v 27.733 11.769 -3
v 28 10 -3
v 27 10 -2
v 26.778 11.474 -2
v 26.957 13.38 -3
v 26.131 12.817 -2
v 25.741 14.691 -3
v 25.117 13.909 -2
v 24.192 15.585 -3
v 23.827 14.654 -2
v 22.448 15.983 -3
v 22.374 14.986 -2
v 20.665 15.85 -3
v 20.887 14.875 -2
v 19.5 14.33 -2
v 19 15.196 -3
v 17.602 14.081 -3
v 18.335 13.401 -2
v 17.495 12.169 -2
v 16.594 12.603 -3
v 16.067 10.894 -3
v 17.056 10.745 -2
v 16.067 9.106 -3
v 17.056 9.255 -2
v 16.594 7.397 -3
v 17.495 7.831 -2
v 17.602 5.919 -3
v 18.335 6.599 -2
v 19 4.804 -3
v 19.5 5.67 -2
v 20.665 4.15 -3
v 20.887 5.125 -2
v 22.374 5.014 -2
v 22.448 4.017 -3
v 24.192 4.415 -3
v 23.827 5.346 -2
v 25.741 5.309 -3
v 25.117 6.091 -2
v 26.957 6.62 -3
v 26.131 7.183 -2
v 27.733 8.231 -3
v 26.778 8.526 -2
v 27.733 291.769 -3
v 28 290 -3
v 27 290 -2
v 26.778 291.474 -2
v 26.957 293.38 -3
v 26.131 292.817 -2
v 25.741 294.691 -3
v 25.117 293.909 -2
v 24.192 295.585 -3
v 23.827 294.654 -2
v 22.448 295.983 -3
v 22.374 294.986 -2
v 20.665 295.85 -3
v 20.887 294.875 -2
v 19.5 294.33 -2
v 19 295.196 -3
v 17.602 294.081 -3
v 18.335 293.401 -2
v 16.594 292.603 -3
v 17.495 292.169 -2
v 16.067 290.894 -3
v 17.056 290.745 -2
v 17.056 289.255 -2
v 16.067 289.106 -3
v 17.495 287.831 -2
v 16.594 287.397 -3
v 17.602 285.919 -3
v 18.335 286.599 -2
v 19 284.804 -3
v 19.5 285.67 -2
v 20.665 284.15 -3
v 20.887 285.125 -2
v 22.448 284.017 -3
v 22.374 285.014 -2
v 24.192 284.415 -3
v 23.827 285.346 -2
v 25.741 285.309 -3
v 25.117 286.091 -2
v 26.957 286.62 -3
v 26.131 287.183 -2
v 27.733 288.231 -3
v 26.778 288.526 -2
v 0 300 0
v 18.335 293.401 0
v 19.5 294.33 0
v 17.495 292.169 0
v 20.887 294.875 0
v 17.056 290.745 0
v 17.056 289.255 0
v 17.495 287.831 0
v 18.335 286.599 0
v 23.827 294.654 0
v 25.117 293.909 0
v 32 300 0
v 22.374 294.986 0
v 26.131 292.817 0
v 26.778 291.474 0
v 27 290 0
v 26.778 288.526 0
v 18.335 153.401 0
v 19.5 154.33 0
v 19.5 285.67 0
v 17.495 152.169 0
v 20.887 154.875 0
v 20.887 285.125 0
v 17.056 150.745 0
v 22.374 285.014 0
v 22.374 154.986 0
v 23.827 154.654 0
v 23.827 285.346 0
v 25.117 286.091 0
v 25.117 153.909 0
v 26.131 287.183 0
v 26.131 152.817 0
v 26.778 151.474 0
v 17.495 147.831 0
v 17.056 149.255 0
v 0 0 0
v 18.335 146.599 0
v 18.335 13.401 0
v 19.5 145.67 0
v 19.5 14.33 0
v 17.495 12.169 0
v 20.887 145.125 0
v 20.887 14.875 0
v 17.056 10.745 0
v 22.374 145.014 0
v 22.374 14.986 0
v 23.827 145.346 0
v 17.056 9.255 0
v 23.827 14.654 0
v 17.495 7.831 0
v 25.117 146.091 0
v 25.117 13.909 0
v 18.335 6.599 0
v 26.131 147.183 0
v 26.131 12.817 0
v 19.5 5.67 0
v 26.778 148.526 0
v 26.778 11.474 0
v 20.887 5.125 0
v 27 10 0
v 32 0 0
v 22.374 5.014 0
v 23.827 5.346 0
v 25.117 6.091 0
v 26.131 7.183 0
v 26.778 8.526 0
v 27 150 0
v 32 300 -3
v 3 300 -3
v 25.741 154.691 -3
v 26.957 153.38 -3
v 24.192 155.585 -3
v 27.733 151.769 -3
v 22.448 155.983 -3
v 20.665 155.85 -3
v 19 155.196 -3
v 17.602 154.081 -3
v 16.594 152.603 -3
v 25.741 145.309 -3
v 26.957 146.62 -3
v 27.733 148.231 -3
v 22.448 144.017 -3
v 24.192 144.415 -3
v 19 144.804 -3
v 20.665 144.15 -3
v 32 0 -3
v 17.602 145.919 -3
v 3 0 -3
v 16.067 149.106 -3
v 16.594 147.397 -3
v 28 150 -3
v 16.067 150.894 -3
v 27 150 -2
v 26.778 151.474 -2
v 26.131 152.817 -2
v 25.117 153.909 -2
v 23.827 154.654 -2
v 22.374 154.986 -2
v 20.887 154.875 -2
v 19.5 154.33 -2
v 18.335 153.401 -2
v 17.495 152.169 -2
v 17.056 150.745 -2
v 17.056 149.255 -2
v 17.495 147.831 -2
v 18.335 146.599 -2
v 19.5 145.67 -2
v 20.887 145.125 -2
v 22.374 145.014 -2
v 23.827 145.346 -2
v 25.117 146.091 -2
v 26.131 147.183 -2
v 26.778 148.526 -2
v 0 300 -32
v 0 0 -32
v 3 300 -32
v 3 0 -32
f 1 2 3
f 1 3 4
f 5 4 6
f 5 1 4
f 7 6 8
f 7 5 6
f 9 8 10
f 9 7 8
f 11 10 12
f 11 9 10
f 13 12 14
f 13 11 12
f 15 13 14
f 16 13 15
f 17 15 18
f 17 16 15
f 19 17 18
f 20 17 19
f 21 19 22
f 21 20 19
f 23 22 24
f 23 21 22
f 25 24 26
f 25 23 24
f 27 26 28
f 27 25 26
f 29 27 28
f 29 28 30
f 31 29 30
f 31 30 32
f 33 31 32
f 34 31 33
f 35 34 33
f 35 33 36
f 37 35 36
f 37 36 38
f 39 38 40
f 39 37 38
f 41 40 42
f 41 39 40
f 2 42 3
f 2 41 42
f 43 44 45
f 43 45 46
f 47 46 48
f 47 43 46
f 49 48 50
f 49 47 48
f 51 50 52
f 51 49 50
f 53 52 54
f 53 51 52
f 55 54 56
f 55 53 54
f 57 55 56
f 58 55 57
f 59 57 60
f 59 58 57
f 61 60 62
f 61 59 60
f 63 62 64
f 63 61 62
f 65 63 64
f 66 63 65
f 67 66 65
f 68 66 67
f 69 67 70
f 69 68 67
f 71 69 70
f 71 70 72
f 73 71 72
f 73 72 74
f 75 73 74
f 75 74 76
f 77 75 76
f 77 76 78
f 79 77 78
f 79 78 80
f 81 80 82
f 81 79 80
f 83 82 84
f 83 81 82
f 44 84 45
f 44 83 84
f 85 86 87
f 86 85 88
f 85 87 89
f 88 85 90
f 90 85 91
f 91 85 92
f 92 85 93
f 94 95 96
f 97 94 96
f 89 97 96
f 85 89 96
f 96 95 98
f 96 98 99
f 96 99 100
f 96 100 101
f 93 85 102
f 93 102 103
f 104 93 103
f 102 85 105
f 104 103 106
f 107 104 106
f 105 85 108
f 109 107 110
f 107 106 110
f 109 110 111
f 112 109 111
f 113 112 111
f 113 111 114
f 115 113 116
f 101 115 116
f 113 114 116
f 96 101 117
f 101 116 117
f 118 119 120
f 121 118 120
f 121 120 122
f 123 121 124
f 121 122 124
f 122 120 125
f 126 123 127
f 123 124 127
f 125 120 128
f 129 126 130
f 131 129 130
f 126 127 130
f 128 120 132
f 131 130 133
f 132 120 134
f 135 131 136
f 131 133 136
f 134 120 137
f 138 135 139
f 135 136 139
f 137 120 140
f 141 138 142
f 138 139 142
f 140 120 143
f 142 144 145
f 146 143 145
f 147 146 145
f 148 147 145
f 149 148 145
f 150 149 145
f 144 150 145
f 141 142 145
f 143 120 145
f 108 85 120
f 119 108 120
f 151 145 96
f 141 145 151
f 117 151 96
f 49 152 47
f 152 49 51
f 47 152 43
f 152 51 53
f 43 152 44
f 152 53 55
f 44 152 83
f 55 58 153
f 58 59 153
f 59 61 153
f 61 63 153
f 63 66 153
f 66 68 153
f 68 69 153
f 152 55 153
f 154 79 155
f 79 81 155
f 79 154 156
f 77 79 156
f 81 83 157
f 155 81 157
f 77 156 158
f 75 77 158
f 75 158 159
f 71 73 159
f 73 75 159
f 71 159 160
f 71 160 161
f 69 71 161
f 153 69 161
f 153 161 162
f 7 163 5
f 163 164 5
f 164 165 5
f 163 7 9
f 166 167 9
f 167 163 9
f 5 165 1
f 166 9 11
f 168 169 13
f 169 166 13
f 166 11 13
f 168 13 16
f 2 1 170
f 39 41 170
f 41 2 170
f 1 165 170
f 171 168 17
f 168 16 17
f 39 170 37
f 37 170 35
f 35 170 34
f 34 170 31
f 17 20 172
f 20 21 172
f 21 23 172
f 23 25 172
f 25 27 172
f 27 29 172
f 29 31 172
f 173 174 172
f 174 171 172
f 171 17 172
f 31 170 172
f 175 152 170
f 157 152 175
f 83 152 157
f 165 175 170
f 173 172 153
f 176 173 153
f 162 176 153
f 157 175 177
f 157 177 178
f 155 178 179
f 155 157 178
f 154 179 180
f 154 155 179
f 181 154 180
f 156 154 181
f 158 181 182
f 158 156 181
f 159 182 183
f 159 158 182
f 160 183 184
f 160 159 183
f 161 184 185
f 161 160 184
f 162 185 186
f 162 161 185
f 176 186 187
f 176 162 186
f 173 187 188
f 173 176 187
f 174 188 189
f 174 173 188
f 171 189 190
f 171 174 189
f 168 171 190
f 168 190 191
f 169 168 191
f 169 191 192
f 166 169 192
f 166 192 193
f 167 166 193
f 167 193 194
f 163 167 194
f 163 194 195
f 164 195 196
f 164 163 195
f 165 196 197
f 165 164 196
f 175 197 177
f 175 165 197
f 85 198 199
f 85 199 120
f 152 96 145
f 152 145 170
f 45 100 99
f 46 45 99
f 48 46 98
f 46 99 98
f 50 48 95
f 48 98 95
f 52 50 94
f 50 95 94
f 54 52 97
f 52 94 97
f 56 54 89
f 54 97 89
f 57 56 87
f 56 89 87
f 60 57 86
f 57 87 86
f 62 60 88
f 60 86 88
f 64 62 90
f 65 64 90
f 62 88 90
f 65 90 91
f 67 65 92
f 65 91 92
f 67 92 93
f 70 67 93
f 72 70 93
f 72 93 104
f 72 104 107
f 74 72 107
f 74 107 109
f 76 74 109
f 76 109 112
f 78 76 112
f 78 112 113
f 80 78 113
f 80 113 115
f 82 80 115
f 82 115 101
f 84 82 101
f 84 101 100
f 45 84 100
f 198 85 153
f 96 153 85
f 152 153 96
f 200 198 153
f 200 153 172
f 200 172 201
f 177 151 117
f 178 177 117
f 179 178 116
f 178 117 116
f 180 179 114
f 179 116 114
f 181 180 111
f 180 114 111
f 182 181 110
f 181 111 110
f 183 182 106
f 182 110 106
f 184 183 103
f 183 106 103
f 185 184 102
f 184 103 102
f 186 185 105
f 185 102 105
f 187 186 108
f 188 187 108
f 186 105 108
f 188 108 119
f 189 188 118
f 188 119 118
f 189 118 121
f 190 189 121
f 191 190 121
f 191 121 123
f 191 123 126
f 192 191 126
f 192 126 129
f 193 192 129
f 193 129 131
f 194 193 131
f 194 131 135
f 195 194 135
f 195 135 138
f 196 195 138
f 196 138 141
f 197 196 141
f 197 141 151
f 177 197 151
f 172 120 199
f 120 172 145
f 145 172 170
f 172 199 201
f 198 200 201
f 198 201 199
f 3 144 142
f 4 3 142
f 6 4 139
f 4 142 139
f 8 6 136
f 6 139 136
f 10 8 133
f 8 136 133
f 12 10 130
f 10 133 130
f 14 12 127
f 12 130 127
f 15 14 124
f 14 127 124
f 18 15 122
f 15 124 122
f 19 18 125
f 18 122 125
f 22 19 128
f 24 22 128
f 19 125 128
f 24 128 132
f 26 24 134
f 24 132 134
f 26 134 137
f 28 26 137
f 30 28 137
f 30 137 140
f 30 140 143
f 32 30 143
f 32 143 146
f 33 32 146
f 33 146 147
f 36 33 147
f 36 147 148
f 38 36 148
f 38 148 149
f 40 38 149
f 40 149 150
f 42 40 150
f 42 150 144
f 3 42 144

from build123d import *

# Parameters (mm, degrees)
EXTRUDE_1_DEPTH     = 300
SKETCH_2_R          = 5
CUT_EXTRUDE_1_DEPTH = 33
CHAMFER_1_SIZE      = 1


with BuildPart() as part:
    # Эскиз1 → Вытянуть-Тонкостенный1 (new body)
    with BuildSketch(Plane(origin=(0, 0, 0), x_dir=(1, 0, 0), z_dir=(0, 1, 0))):
        Polygon((0, 32), (0, 0), (32, 0), (32, 3), (3, 3), (3, 32), align=None)
    extrude(amount=EXTRUDE_1_DEPTH)

    # Эскиз2 → Вырез-Вытянуть1 (cut, through all)
    with BuildSketch(Plane.XY):
        with Locations((22, 10)):
            Circle(SKETCH_2_R)
        with Locations((22, 150)):
            Circle(SKETCH_2_R)
        with Locations((22, 290)):
            Circle(SKETCH_2_R)
    extrude(amount=-CUT_EXTRUDE_1_DEPTH, mode=Mode.SUBTRACT)

    # Фаска1
    chamfer_1_edges = [part.edges().sort_by_distance(p)[0] for p in [
        (17, 10, -3),
        (17, 150, -3),
        (17, 290, -3),
    ]]
    chamfer(chamfer_1_edges, length=CHAMFER_1_SIZE)


solid = part.part
